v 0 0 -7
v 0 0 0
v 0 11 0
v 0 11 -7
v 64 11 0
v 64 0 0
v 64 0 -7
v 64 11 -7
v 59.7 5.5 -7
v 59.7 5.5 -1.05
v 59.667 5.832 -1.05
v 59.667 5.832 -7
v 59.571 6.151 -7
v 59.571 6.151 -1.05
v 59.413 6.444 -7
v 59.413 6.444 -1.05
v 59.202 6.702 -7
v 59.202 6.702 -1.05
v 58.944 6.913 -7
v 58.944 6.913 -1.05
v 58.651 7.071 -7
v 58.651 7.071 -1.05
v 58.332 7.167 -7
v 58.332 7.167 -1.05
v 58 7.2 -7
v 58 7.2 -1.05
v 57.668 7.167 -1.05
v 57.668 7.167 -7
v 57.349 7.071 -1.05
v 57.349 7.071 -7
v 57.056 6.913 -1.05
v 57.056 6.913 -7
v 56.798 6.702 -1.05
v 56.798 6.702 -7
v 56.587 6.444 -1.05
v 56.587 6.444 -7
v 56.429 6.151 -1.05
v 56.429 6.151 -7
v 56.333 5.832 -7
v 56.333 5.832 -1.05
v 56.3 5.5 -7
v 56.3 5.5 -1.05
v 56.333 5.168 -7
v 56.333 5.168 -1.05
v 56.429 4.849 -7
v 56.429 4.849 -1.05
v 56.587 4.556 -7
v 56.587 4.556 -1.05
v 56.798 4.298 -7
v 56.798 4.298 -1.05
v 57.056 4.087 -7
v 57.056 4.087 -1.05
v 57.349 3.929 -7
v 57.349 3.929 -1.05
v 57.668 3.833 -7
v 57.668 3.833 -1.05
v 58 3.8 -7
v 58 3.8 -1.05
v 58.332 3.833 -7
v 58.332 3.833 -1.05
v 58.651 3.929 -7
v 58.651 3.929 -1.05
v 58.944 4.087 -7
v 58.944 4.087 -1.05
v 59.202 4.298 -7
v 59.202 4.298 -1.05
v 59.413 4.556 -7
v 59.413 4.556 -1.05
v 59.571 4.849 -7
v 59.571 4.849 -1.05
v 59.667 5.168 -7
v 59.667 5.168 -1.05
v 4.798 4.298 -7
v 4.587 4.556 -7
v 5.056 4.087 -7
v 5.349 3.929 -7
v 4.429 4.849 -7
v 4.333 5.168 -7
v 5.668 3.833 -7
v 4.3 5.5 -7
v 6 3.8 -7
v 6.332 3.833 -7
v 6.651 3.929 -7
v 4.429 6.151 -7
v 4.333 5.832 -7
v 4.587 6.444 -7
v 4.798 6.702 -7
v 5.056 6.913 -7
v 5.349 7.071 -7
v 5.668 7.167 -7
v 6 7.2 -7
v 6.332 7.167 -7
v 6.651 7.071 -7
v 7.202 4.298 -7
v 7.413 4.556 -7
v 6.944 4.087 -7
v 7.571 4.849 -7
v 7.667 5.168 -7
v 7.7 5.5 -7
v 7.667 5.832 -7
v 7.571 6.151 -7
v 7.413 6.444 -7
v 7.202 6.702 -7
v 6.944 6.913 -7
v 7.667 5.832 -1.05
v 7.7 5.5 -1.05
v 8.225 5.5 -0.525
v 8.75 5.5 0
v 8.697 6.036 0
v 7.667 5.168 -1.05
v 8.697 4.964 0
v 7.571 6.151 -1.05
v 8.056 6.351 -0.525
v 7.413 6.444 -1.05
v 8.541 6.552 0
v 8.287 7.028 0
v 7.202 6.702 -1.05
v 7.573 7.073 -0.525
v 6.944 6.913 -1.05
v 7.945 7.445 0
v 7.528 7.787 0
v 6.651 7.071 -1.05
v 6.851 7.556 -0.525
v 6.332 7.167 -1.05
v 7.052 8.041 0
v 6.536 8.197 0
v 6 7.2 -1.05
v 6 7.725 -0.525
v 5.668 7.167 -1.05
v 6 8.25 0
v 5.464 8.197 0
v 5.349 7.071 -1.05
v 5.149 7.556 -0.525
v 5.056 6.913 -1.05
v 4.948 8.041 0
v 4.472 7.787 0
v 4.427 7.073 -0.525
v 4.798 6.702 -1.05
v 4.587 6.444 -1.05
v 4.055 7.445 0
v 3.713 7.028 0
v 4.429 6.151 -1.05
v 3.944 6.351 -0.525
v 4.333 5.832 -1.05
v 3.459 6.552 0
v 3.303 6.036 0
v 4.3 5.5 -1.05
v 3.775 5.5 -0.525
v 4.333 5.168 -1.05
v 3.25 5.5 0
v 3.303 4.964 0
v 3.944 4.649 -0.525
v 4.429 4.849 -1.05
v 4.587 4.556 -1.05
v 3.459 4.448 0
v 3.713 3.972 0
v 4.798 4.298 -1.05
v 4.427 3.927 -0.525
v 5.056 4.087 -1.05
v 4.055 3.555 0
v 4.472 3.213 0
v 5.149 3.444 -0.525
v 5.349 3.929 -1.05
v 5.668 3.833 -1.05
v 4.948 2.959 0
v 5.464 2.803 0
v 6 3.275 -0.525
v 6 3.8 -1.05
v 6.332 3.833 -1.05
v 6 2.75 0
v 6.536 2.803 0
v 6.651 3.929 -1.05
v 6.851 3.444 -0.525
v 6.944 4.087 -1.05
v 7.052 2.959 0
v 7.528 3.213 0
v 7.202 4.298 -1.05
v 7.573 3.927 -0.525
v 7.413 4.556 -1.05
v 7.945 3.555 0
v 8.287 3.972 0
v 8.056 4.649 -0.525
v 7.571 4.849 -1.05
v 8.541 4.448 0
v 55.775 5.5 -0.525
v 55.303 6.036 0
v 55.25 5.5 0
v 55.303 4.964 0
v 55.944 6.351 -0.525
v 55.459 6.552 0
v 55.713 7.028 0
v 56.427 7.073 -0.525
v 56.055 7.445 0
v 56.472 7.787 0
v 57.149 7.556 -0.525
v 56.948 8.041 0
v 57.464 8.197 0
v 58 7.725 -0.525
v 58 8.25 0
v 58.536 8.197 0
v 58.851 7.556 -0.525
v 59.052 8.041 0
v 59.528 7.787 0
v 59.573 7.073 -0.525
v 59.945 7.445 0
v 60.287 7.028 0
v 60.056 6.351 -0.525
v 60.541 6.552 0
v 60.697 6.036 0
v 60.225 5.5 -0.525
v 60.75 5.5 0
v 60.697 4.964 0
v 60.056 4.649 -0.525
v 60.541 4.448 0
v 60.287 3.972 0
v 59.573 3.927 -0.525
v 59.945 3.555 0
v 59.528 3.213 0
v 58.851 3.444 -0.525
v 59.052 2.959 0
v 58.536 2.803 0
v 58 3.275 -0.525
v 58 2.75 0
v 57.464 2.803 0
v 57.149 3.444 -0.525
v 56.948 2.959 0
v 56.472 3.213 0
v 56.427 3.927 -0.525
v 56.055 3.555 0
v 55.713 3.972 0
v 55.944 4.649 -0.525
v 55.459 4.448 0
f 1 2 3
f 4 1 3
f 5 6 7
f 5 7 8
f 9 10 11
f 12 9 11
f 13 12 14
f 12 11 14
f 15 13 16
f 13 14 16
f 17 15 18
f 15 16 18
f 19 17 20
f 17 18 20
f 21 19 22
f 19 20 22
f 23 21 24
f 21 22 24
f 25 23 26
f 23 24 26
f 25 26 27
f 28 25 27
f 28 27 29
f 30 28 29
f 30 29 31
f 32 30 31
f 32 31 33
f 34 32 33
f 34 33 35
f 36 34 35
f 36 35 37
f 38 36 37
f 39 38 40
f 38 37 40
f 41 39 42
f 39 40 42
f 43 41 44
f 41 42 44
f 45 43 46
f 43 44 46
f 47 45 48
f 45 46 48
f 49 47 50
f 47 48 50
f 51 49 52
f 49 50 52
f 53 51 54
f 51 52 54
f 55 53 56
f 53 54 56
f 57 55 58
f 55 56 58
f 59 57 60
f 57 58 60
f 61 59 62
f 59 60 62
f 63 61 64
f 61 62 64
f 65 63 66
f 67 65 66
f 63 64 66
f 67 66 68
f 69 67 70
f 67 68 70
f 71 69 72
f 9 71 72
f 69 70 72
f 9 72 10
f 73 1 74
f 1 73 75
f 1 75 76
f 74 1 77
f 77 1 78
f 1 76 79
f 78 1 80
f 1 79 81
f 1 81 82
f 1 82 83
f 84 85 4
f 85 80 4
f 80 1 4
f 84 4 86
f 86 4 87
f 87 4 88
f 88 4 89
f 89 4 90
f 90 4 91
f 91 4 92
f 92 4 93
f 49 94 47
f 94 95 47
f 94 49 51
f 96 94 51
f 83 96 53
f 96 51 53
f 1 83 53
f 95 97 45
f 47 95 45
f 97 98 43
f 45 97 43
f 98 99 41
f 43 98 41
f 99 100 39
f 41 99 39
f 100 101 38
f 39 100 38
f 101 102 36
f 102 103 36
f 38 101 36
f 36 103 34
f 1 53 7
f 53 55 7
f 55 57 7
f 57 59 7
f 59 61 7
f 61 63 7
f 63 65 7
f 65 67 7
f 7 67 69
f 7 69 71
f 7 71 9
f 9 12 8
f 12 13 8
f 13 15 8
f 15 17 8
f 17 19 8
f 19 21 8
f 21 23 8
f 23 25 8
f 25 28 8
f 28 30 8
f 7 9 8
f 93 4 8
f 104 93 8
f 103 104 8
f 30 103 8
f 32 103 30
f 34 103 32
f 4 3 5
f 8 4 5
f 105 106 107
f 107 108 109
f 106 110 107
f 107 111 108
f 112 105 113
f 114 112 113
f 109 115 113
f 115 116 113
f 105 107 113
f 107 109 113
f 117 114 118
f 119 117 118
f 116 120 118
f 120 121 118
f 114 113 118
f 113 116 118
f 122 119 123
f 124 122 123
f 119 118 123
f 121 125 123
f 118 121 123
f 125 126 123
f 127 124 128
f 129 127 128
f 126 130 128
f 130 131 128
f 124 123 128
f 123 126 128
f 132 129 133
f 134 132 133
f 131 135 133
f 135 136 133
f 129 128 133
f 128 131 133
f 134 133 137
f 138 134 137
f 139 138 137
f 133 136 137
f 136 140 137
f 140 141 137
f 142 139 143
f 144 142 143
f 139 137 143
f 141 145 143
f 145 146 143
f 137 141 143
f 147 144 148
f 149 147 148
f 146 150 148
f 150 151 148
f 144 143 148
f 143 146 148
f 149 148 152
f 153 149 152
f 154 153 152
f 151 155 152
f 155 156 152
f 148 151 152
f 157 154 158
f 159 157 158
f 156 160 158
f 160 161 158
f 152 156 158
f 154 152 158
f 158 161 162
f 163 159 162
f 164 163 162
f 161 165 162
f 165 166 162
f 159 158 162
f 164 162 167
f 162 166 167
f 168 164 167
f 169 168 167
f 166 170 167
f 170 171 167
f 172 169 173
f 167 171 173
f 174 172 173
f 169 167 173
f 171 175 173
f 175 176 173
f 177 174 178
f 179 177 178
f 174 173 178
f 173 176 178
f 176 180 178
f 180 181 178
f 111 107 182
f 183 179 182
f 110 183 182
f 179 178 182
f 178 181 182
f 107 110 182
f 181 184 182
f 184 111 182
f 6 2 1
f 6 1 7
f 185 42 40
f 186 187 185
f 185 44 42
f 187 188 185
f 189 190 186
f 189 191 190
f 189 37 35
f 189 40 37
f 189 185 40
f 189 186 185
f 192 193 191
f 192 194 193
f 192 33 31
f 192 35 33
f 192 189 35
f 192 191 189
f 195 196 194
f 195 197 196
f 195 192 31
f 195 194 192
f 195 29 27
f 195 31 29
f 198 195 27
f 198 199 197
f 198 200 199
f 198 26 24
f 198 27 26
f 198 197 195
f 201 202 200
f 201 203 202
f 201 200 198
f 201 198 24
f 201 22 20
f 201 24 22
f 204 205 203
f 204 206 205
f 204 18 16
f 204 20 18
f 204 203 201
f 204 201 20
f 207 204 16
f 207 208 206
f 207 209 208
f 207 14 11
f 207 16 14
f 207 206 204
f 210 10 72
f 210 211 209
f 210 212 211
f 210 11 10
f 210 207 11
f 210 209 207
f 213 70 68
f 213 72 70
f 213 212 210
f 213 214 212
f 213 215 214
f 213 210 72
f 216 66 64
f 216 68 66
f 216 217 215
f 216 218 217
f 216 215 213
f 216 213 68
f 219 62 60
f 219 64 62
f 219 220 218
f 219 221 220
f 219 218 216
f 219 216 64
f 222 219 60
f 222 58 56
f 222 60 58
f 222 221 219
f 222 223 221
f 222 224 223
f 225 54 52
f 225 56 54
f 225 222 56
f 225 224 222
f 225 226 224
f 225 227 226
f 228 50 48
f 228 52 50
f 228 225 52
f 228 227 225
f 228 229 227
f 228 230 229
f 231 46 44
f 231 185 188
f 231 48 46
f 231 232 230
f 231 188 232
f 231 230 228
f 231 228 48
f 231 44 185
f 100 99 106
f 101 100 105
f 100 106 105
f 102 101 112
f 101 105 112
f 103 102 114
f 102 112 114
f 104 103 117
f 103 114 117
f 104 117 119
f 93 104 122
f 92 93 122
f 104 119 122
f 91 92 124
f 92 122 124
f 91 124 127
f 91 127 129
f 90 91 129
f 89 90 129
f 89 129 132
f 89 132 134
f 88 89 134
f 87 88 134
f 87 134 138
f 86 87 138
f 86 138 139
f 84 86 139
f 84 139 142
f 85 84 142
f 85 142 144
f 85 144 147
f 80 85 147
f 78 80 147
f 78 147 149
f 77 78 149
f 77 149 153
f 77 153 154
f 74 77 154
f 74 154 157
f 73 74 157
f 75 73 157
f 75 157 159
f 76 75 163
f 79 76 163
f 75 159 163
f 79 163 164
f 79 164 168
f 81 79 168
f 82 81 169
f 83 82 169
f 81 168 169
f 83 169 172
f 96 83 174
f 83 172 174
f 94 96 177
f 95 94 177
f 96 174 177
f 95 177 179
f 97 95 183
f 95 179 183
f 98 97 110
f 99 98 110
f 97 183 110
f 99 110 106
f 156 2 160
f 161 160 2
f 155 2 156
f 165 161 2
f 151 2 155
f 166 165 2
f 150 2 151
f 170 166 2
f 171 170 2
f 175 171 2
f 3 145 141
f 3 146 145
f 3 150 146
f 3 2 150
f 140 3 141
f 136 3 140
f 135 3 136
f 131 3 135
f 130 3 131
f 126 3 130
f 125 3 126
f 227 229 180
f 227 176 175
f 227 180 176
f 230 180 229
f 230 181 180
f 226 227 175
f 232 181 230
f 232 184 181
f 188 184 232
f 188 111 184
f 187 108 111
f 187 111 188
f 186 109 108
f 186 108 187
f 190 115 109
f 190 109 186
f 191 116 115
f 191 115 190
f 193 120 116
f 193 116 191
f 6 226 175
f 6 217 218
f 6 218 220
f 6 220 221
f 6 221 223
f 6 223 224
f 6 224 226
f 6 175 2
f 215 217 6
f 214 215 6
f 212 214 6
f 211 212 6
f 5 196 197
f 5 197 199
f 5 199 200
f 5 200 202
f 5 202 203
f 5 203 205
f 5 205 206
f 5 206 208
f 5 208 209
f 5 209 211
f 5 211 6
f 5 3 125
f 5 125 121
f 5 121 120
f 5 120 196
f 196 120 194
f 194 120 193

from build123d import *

# Parameters (mm, degrees)
SKETCH1_W           = 64
SKETCH1_H           = 11
BOSS_EXTRUDE1_DEPTH = 7
SKETCH3_R           = 1.7
CUT_EXTRUDE1_DEPTH  = 66.314623171


with BuildPart() as part:
    # Sketch1 → Boss-Extrude1 (new body)
    with BuildSketch(Plane.XY):
        with Locations((32, 5.5)):
            Rectangle(SKETCH1_W, SKETCH1_H)
    extrude(amount=-BOSS_EXTRUDE1_DEPTH)

    # Sketch3 → Cut-Extrude1 (cut, through all)
    with BuildSketch(Plane.XY):
        with Locations((6, 5.5)):
            Circle(SKETCH3_R)
        with Locations((58, 5.5)):
            Circle(SKETCH3_R)
    extrude(amount=-CUT_EXTRUDE1_DEPTH, mode=Mode.SUBTRACT)

    # Sketch7 → Cut-Revolve1 (revolve, cut)
    with BuildSketch(Plane(origin=(0, 5.5, 0), x_dir=(1, 0, 0), z_dir=(0, 1, 0)), mode=Mode.PRIVATE) as cut_revolve1_sk:
        Polygon((3.25, 0), (6, 0), (6, 2.75), align=None)
    cut_revolve1 = revolve(cut_revolve1_sk.sketch.rotate(Axis((6, 5.5, -2.75), (0, 0, 1)), 180), axis=Axis((6, 5.5, -2.75), (0, 0, 1)), mode=Mode.SUBTRACT)

    # Mirror1: Cut-Revolve1 across plane
    add(cut_revolve1.mirror(Plane(origin=(32, 0, 0), x_dir=(0, 0, 1), z_dir=(1, 0, 0))), mode=Mode.SUBTRACT)


solid = part.part
